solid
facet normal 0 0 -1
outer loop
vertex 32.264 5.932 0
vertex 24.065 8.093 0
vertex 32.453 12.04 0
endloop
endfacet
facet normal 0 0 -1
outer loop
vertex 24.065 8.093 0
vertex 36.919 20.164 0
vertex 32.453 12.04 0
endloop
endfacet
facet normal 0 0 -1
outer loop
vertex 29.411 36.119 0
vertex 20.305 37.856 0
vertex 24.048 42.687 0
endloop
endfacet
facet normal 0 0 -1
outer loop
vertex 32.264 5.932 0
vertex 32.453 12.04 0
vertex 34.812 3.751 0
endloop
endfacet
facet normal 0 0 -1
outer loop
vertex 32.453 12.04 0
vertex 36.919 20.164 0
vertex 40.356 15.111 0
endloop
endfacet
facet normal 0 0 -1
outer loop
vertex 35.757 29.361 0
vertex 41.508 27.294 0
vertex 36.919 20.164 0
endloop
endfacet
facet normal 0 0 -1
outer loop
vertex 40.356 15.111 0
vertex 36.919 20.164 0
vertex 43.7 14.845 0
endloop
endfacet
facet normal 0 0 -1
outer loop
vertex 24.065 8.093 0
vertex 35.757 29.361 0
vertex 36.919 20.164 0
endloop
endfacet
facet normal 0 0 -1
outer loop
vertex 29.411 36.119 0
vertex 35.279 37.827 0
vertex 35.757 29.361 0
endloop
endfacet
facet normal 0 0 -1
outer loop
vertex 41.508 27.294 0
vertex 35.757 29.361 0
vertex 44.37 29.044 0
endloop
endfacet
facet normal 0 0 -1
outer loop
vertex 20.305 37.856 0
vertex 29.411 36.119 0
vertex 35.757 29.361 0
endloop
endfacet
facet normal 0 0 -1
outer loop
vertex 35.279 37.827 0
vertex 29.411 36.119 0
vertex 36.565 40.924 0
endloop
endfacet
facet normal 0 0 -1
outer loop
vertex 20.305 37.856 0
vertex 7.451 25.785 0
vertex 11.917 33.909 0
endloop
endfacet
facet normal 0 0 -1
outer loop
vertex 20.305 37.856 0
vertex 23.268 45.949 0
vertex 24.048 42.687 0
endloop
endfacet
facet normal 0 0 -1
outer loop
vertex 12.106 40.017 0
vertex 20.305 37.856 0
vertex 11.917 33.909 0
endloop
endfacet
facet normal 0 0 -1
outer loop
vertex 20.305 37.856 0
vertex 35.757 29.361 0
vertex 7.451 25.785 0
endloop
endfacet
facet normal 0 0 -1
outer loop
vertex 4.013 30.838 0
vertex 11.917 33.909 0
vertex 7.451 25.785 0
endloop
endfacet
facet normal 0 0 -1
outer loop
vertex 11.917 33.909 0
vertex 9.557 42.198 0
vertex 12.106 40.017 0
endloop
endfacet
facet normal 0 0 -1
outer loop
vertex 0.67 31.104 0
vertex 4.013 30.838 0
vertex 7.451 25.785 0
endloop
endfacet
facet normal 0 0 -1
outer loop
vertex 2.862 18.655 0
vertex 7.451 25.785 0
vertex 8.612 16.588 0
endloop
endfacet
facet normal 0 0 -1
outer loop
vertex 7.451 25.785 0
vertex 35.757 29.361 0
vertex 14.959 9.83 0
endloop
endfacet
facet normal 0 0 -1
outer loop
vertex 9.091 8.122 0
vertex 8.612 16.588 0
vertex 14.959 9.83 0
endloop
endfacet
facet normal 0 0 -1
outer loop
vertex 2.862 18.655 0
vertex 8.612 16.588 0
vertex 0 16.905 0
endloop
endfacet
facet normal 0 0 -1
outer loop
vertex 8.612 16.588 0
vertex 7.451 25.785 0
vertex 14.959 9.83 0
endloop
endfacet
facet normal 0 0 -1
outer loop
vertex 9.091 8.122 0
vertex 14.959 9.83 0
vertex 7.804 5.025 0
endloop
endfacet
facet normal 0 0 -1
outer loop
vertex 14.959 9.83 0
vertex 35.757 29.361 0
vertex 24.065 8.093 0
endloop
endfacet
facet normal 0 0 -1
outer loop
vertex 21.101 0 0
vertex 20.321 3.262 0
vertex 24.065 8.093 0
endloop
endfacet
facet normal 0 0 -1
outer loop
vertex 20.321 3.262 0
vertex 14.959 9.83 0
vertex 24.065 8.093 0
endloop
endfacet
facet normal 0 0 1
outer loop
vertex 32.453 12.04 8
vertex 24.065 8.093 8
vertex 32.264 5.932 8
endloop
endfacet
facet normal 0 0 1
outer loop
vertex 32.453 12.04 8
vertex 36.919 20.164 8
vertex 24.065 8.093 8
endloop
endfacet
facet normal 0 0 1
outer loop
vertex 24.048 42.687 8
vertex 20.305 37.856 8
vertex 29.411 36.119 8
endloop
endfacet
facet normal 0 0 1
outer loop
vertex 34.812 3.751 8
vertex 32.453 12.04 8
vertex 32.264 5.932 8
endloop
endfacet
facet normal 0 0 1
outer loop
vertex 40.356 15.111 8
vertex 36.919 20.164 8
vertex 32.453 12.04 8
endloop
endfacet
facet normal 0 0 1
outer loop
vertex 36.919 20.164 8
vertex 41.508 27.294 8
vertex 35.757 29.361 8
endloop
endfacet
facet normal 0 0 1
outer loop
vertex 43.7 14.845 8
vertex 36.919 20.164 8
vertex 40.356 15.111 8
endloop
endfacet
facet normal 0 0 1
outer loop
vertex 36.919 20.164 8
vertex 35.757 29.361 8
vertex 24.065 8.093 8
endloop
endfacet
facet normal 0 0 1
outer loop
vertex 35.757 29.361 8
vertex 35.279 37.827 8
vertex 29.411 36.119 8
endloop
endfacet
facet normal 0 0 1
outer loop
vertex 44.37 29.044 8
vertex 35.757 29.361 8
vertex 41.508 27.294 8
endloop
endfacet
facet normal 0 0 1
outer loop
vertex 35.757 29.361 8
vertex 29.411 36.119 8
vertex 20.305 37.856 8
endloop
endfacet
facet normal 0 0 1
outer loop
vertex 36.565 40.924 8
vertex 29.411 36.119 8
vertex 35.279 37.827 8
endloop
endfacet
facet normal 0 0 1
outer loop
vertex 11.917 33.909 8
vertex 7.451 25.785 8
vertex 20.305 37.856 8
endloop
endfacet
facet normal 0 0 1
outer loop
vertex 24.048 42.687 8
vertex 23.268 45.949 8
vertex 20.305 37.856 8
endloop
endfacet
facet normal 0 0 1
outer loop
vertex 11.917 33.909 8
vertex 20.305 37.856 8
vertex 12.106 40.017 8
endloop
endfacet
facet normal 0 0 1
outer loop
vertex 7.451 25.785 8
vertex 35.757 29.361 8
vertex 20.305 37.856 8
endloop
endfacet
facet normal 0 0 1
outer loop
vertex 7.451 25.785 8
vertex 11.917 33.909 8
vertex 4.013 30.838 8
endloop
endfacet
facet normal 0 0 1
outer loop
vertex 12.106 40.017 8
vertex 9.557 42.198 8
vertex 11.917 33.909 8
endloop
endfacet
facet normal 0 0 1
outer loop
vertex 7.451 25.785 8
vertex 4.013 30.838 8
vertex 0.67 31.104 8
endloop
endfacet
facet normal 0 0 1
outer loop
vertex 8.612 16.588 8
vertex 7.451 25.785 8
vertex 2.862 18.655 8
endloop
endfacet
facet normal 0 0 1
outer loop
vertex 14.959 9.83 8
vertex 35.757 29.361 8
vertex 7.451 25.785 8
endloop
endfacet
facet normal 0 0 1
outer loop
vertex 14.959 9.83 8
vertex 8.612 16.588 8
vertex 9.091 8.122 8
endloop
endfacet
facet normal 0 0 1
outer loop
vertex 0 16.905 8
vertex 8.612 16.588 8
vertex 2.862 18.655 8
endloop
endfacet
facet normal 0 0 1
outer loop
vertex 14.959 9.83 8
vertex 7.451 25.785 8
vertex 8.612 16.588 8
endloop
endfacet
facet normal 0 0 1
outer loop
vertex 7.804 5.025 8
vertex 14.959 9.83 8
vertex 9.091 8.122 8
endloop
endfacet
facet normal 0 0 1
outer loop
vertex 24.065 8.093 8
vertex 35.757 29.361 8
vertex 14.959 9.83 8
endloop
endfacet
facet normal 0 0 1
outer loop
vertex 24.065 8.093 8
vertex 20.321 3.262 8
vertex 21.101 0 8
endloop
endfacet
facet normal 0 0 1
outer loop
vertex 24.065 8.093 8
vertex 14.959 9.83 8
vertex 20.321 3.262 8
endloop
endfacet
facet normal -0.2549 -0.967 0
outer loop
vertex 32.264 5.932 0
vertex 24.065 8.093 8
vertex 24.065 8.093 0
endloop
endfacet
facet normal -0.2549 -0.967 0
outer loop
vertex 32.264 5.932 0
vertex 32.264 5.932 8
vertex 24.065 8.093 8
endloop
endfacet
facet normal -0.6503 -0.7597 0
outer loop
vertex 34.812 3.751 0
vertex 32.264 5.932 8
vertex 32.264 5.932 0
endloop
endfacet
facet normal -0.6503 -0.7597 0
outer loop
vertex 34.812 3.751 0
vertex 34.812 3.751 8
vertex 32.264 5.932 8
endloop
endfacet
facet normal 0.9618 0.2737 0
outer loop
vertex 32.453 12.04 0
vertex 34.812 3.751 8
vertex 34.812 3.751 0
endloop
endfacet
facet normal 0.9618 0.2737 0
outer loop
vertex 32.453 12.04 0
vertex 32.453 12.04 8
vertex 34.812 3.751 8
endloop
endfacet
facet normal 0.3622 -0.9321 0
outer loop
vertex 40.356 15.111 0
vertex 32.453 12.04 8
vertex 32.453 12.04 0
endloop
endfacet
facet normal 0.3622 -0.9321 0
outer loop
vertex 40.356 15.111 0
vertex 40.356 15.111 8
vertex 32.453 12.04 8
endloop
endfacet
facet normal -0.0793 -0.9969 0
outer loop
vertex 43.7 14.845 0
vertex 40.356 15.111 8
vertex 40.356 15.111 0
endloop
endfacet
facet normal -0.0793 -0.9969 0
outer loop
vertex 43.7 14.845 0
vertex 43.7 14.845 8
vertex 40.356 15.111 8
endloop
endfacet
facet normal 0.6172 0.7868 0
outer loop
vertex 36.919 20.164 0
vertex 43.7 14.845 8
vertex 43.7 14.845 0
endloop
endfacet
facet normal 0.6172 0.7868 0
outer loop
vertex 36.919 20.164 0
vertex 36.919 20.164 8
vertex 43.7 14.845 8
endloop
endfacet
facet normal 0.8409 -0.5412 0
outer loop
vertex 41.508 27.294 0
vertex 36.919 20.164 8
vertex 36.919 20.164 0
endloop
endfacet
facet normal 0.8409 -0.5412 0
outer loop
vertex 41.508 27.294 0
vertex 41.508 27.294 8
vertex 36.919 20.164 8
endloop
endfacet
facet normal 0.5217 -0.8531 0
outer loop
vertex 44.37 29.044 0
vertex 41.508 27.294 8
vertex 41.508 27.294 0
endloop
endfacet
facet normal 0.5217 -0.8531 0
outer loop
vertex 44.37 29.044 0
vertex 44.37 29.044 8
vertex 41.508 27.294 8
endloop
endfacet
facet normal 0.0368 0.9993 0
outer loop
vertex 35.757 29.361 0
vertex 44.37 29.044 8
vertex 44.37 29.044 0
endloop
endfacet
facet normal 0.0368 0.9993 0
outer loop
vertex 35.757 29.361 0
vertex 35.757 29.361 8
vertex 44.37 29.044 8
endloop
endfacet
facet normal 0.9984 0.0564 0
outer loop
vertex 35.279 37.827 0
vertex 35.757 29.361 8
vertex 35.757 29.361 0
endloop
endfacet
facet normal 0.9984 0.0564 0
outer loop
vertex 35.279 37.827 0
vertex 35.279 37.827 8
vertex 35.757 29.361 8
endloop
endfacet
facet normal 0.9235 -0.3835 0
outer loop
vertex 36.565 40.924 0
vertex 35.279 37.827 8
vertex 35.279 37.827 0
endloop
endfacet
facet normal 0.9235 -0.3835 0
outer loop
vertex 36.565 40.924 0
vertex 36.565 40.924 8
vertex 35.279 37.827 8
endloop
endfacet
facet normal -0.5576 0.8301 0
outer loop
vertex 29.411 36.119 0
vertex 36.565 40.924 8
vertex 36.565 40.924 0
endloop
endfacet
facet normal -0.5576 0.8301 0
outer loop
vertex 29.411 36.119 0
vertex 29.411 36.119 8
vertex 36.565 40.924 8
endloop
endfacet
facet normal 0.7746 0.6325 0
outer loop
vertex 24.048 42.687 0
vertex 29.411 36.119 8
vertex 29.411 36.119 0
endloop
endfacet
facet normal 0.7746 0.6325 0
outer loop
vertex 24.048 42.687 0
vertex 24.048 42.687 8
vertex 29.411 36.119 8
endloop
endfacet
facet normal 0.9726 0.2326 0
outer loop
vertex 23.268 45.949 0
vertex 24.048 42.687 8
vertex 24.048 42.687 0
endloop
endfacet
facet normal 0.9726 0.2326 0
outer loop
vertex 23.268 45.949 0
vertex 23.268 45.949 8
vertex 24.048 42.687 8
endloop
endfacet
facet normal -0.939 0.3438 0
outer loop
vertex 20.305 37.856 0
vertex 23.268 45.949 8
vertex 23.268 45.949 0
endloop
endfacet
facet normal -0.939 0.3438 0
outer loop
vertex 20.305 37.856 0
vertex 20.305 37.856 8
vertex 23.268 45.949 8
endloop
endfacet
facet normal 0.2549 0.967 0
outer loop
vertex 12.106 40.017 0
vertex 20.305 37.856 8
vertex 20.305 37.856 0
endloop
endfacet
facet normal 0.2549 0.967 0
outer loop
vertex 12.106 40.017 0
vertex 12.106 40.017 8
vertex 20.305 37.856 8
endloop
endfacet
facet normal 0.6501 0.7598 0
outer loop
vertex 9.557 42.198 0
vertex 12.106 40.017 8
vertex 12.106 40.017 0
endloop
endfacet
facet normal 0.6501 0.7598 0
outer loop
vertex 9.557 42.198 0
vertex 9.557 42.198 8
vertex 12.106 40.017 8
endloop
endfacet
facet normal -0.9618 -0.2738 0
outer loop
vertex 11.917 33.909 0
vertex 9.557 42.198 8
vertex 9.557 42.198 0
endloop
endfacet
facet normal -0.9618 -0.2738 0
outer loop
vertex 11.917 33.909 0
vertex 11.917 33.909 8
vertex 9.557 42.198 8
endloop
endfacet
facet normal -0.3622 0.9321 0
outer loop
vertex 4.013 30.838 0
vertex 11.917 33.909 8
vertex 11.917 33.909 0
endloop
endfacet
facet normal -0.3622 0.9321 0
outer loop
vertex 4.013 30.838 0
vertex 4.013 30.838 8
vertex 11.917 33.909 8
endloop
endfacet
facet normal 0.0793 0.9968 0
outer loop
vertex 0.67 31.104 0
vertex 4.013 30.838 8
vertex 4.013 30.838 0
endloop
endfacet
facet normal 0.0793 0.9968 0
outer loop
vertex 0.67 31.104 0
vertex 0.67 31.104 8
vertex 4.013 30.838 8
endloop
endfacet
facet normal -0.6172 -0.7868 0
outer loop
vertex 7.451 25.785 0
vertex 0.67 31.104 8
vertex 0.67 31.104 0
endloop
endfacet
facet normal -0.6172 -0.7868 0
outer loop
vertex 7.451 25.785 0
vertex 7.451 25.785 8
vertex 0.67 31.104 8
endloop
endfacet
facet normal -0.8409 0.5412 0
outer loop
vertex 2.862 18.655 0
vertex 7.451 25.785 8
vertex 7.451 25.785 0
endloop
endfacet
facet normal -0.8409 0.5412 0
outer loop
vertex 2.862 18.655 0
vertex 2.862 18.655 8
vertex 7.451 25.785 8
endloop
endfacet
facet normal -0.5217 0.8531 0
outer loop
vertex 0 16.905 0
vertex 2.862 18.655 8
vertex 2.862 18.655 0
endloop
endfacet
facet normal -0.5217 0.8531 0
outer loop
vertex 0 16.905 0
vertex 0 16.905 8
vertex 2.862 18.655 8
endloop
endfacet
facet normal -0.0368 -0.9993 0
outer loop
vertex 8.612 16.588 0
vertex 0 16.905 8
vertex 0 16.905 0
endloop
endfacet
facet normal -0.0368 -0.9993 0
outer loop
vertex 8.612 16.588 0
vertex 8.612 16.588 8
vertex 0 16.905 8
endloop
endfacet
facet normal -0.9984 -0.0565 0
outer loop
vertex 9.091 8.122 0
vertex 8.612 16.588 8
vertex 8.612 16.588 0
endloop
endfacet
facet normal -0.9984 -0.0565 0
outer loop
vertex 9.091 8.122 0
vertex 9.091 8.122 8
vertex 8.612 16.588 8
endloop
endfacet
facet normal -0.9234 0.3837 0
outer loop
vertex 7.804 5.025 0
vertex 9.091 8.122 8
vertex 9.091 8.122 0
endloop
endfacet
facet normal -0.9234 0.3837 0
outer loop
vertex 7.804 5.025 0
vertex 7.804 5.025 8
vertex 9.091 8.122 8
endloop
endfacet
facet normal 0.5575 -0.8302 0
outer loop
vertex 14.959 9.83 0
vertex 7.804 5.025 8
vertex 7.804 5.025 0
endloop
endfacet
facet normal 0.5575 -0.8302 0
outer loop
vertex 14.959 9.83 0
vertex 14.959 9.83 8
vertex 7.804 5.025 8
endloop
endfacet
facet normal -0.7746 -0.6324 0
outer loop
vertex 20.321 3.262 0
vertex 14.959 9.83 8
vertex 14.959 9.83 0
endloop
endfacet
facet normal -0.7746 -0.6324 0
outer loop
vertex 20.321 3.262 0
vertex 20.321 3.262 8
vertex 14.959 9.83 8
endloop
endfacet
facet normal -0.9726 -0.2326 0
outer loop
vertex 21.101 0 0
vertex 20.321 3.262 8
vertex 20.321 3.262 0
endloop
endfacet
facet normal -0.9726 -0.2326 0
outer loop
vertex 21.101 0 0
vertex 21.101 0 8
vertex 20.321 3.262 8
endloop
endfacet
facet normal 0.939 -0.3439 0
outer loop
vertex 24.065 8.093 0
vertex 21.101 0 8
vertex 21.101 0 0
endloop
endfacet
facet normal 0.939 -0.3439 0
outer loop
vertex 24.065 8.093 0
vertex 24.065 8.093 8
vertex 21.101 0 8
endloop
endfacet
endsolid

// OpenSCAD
$fn = 32;

// ----------------------------------------------------------------------
// Fan rotor section: 10 blades, 15 mm hub radius, 8 mm blades
// ----------------------------------------------------------------------

// --- parameters (mm) ---
profile_height = 8;       // extrusion height
profile_points = 30;      // points of the closed outline

profile = [[36.919, 20.164], [41.508, 27.294], [44.37, 29.044], [35.757, 29.361], [35.279, 37.827], [36.565, 40.924], [29.411, 36.119], [24.048, 42.687], [23.268, 45.949], [20.305, 37.856], [12.106, 40.017], [9.557, 42.198], [11.917, 33.909], [4.013, 30.838], [0.67, 31.104], [7.451, 25.785], [2.862, 18.655], [0, 16.905], [8.612, 16.588], [9.091, 8.122], [7.804, 5.025], [14.959, 9.83], [20.321, 3.262], [21.101, 0], [24.065, 8.093], [32.264, 5.932], [34.812, 3.751], [32.453, 12.04], [40.356, 15.111], [43.7, 14.845]];  // single closed polygon, 30 points, counter clockwise

// --- the one profile operation ---
linear_extrude(height = profile_height) polygon(points = profile);
